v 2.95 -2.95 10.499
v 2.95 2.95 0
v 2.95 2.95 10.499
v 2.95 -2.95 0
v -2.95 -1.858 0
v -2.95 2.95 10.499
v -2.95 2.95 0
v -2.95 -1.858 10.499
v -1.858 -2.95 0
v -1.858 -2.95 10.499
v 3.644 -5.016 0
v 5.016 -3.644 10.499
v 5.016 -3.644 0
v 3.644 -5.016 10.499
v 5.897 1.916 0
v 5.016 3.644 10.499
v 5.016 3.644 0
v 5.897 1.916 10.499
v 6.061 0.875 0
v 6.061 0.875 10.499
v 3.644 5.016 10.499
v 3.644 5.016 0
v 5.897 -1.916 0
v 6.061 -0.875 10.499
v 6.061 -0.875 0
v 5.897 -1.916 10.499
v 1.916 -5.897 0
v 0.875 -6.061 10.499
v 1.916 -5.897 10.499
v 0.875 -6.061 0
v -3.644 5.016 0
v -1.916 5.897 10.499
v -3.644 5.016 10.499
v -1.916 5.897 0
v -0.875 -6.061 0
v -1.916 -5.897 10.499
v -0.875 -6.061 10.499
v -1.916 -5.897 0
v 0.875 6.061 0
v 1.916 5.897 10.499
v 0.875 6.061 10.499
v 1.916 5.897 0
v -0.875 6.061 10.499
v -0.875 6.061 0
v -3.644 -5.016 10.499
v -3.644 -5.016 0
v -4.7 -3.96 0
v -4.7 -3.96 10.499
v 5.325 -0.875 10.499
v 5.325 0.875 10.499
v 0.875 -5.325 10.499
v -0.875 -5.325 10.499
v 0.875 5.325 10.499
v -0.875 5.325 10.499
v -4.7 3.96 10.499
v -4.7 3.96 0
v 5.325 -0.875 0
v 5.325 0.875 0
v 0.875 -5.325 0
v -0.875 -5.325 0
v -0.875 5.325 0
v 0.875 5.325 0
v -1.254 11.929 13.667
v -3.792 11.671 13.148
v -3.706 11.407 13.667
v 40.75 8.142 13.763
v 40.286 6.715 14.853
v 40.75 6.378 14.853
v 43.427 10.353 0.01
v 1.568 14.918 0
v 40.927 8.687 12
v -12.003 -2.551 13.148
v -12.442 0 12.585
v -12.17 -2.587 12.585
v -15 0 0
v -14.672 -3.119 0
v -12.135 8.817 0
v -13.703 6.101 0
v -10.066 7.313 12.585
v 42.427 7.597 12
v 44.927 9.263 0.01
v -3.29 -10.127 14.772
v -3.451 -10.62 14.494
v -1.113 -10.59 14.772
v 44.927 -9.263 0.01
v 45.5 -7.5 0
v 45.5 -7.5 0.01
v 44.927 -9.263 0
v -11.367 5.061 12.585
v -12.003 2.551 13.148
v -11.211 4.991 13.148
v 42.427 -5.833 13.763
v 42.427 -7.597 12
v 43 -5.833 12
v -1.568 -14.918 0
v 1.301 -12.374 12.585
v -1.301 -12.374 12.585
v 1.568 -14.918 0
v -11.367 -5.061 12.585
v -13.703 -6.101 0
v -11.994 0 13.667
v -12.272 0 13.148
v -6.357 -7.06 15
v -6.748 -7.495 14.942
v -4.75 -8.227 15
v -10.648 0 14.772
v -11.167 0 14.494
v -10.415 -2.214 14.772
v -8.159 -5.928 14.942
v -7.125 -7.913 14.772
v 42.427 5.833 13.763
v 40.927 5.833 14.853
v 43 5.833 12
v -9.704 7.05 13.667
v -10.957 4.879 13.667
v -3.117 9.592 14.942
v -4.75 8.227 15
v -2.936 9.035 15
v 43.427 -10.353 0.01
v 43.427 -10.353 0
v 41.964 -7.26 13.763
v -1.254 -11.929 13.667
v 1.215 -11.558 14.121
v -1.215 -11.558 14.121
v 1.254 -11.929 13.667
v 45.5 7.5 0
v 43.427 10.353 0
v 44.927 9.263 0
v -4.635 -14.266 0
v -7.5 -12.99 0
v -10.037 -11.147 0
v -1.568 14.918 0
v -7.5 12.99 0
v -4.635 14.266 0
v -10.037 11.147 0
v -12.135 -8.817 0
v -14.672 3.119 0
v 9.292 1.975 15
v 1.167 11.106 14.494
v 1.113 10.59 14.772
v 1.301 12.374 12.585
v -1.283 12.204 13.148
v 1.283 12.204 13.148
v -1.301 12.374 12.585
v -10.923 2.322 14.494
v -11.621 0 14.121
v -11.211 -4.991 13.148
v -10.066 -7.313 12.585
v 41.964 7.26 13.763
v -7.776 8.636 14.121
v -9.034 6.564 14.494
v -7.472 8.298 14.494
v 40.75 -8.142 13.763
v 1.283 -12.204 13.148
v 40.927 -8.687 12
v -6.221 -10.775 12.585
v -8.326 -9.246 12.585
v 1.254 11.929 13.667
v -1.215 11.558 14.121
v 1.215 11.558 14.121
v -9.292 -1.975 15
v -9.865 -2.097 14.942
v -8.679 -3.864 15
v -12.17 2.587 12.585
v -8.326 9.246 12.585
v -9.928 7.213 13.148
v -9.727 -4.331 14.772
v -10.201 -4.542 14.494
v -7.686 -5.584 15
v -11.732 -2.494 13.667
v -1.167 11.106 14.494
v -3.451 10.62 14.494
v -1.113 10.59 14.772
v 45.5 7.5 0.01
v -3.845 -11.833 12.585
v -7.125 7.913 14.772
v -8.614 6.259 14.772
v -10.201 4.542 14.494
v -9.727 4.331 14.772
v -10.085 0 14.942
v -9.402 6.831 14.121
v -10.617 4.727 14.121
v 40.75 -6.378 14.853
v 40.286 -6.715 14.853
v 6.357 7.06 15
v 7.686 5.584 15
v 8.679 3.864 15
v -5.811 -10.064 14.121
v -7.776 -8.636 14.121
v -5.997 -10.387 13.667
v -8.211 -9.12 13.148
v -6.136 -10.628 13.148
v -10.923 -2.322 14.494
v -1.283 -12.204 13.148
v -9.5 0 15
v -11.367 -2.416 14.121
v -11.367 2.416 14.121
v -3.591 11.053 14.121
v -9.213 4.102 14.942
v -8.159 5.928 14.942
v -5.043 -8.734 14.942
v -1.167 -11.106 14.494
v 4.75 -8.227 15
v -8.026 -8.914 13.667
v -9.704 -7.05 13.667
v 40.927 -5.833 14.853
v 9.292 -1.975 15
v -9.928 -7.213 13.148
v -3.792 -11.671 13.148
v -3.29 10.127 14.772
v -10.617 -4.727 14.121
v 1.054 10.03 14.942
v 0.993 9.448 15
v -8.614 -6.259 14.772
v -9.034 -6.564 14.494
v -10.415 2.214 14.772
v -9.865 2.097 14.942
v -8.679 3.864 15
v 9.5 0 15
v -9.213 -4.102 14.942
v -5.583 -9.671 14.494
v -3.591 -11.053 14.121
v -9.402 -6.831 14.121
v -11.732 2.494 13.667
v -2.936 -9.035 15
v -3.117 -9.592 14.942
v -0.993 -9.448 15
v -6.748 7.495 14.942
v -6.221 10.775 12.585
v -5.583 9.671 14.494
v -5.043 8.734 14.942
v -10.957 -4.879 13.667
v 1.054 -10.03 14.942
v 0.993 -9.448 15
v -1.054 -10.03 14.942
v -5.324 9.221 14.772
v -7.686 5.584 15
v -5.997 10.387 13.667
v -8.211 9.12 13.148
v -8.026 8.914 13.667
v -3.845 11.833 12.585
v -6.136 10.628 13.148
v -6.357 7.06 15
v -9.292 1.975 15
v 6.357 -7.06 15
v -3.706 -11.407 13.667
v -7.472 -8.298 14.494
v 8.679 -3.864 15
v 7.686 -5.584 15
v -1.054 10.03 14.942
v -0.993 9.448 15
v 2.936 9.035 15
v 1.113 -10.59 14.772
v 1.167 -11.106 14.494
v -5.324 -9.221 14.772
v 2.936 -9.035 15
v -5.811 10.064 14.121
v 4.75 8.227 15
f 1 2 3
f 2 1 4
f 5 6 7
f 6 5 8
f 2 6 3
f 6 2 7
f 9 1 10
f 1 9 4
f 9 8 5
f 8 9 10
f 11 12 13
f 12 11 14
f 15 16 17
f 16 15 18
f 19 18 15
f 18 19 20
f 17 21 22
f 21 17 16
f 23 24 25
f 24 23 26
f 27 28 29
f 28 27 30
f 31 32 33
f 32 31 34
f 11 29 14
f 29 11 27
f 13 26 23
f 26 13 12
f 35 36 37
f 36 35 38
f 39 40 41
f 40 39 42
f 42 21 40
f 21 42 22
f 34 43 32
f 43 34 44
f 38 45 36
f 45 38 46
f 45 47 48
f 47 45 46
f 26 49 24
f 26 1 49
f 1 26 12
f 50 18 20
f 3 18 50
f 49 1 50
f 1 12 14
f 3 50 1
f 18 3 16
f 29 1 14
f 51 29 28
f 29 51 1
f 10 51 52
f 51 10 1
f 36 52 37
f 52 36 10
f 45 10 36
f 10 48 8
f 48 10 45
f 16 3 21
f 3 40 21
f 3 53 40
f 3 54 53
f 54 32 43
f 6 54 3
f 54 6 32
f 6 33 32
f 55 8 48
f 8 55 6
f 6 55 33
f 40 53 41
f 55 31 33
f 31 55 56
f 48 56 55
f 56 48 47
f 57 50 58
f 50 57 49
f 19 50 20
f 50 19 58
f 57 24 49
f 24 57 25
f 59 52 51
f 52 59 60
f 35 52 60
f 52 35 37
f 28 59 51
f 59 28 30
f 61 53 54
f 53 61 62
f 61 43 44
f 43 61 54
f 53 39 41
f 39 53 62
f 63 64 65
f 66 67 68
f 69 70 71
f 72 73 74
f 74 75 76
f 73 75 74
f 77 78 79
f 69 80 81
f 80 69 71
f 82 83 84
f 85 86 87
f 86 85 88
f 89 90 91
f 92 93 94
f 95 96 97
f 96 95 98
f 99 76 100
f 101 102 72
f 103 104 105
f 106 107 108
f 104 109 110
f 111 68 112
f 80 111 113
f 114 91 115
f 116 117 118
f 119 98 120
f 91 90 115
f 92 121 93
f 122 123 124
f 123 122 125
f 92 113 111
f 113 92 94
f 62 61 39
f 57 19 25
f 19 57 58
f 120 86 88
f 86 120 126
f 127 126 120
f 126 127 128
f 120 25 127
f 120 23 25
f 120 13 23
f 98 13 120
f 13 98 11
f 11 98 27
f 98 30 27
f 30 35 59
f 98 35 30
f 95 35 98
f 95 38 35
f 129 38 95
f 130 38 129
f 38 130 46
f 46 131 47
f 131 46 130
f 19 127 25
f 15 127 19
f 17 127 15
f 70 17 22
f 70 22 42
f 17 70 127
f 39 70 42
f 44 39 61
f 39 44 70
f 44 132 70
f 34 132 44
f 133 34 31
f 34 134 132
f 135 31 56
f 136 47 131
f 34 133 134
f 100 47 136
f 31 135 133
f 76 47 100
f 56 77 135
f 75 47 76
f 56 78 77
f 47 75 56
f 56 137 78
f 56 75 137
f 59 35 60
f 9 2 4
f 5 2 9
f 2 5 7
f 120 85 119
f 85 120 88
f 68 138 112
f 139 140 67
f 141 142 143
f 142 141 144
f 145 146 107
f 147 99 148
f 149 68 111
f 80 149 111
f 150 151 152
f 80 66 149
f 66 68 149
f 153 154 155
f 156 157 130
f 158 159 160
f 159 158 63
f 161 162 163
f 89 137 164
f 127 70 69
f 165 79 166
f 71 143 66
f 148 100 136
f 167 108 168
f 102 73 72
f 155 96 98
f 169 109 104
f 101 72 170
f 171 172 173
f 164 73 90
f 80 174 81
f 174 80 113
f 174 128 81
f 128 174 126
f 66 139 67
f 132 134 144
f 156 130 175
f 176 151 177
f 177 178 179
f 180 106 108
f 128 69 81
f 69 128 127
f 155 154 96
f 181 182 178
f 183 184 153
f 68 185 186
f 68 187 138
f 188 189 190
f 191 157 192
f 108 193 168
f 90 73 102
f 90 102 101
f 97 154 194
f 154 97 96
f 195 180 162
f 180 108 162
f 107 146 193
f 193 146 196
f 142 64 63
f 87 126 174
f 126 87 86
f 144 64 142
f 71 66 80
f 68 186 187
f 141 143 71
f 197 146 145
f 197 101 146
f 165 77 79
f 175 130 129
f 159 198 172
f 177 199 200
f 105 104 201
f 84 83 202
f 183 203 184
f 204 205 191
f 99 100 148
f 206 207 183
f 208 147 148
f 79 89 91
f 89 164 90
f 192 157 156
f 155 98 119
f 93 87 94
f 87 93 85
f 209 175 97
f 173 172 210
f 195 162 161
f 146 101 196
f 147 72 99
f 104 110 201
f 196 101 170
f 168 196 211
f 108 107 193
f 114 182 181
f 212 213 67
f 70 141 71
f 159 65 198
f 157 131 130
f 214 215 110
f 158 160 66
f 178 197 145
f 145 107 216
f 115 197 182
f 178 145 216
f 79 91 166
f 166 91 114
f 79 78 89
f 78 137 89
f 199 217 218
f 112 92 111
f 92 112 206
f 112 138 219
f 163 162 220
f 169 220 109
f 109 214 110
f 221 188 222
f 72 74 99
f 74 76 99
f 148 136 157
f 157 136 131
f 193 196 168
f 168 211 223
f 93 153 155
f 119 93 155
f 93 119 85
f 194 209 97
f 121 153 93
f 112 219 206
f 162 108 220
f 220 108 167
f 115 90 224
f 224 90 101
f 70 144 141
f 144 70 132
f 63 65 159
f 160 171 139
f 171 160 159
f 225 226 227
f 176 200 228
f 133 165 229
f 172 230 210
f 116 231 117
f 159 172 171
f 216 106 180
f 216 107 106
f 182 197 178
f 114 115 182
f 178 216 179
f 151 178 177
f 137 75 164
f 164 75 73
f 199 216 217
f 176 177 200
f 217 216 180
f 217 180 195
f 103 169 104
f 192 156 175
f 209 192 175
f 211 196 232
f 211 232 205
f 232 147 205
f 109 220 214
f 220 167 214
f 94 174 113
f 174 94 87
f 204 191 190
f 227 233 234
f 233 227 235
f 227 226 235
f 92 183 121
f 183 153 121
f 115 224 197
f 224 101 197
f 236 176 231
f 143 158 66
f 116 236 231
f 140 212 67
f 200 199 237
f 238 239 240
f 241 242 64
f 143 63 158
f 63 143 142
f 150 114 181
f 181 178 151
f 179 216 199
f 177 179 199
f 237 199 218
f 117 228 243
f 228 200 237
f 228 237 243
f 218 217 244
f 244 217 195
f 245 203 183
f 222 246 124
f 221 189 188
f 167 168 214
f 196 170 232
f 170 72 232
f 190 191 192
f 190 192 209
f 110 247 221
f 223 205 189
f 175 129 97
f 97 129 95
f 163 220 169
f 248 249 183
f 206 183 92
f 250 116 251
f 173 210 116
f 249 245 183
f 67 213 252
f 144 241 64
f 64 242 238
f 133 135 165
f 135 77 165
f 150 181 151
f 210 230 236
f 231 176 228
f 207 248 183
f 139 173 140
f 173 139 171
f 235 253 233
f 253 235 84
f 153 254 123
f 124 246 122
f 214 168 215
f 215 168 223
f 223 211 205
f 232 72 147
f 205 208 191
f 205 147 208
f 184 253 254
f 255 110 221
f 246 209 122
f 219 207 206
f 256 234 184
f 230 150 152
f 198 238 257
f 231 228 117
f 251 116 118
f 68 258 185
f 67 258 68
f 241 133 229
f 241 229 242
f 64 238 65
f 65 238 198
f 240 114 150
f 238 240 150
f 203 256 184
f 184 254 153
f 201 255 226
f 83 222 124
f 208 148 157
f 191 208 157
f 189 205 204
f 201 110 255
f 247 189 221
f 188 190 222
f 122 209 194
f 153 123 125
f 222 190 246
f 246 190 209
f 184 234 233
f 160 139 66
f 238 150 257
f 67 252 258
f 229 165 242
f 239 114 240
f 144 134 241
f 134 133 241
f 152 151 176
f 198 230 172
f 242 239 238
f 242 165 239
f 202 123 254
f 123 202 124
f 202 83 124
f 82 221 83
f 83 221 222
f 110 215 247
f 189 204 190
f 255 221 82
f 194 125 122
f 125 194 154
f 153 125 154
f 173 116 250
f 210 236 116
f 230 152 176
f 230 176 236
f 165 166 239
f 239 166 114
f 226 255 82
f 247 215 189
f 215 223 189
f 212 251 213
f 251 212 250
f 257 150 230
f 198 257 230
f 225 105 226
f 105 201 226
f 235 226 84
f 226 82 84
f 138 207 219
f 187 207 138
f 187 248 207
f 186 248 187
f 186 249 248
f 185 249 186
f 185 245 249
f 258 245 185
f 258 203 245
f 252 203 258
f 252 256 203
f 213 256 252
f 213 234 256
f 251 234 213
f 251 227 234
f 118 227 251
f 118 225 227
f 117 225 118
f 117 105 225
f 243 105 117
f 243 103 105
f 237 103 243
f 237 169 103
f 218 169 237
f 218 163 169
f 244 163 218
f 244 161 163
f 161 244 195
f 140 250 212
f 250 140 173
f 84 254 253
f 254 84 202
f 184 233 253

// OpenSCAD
_t=false;

h=_t?11:15;
d1=_t?15:30;
d2=_t?15:25;
rg=_t?1:3;
h_hole=10.5;
xlen=_t?10:40;

ds1=0; // 3; // screw hole 1
ds2=5; // screw hole inset diameter

d_m=12.4;
d_c=5.9;
d_d=5;
d_h=8;

sx=1.75;
sxe=6.2;
d_corner=3.4;
d_edge=4.7;

_d=0.01;

module griff() {
difference() {
    hull() {
        cylinder(d1=d1,h=0.1);
        translate([0,0,h-rg]) rotate_extrude() translate([d2/2-rg,0]) circle(r=rg, $fn=32);
        //translate([30,0,h/2]) cube([h,h,h], center=true);
        if(!_t) {
        translate([xlen,h/2-(d1-d2)/3,h-rg]) sphere(r=rg);
        translate([xlen,-h/2+(d1-d2)/3,h-rg]) sphere(r=rg);
        translate([xlen+(d1-d2)/2,h/2,0]) linear_extrude(0.01) circle(r=rg);
        translate([xlen+(d1-d2)/2,-h/2,0]) linear_extrude(0.01) circle(r=rg);
        }
    }
    translate([0,0,-0.001]) hole();
}
}
griff();
if(_t)
translate([0,20,0]) intersection() {
    griff();
    cube([d_c+0.5,d_c+0.5,22], center=true);
}

module hole() {
        module edge() {
            // cylinder(h=22,d=2,center=true,$fn=16);
            cube([sx,sx,22], center=true);
        }
    difference() {
        cylinder(h=h_hole,d=d_m);
        difference() {
            cube([d_c,d_c,22], center=true);
            rotate(45) translate([-5-d_corner,0,0]) cube([10,10,22], center=true);
        }
        translate([-10-d_edge,0,0]) cube([20,20,30],center=true);
        translate([sxe,0,0]) edge();
        translate([0,-sxe,0]) rotate(90) edge();
        translate([0,sxe,0]) rotate(-90) edge();
    }

    if(ds1) {
    translate([0,0,d_h/2]) rotate([0,-90,0]) cylinder(h=d1/2,d=ds1,$fn=5);
    translate([d1/2-d2,0,d_h/2]) rotate([0,-90,0]) cylinder(h=d1/2,d=ds2);
    }

}
